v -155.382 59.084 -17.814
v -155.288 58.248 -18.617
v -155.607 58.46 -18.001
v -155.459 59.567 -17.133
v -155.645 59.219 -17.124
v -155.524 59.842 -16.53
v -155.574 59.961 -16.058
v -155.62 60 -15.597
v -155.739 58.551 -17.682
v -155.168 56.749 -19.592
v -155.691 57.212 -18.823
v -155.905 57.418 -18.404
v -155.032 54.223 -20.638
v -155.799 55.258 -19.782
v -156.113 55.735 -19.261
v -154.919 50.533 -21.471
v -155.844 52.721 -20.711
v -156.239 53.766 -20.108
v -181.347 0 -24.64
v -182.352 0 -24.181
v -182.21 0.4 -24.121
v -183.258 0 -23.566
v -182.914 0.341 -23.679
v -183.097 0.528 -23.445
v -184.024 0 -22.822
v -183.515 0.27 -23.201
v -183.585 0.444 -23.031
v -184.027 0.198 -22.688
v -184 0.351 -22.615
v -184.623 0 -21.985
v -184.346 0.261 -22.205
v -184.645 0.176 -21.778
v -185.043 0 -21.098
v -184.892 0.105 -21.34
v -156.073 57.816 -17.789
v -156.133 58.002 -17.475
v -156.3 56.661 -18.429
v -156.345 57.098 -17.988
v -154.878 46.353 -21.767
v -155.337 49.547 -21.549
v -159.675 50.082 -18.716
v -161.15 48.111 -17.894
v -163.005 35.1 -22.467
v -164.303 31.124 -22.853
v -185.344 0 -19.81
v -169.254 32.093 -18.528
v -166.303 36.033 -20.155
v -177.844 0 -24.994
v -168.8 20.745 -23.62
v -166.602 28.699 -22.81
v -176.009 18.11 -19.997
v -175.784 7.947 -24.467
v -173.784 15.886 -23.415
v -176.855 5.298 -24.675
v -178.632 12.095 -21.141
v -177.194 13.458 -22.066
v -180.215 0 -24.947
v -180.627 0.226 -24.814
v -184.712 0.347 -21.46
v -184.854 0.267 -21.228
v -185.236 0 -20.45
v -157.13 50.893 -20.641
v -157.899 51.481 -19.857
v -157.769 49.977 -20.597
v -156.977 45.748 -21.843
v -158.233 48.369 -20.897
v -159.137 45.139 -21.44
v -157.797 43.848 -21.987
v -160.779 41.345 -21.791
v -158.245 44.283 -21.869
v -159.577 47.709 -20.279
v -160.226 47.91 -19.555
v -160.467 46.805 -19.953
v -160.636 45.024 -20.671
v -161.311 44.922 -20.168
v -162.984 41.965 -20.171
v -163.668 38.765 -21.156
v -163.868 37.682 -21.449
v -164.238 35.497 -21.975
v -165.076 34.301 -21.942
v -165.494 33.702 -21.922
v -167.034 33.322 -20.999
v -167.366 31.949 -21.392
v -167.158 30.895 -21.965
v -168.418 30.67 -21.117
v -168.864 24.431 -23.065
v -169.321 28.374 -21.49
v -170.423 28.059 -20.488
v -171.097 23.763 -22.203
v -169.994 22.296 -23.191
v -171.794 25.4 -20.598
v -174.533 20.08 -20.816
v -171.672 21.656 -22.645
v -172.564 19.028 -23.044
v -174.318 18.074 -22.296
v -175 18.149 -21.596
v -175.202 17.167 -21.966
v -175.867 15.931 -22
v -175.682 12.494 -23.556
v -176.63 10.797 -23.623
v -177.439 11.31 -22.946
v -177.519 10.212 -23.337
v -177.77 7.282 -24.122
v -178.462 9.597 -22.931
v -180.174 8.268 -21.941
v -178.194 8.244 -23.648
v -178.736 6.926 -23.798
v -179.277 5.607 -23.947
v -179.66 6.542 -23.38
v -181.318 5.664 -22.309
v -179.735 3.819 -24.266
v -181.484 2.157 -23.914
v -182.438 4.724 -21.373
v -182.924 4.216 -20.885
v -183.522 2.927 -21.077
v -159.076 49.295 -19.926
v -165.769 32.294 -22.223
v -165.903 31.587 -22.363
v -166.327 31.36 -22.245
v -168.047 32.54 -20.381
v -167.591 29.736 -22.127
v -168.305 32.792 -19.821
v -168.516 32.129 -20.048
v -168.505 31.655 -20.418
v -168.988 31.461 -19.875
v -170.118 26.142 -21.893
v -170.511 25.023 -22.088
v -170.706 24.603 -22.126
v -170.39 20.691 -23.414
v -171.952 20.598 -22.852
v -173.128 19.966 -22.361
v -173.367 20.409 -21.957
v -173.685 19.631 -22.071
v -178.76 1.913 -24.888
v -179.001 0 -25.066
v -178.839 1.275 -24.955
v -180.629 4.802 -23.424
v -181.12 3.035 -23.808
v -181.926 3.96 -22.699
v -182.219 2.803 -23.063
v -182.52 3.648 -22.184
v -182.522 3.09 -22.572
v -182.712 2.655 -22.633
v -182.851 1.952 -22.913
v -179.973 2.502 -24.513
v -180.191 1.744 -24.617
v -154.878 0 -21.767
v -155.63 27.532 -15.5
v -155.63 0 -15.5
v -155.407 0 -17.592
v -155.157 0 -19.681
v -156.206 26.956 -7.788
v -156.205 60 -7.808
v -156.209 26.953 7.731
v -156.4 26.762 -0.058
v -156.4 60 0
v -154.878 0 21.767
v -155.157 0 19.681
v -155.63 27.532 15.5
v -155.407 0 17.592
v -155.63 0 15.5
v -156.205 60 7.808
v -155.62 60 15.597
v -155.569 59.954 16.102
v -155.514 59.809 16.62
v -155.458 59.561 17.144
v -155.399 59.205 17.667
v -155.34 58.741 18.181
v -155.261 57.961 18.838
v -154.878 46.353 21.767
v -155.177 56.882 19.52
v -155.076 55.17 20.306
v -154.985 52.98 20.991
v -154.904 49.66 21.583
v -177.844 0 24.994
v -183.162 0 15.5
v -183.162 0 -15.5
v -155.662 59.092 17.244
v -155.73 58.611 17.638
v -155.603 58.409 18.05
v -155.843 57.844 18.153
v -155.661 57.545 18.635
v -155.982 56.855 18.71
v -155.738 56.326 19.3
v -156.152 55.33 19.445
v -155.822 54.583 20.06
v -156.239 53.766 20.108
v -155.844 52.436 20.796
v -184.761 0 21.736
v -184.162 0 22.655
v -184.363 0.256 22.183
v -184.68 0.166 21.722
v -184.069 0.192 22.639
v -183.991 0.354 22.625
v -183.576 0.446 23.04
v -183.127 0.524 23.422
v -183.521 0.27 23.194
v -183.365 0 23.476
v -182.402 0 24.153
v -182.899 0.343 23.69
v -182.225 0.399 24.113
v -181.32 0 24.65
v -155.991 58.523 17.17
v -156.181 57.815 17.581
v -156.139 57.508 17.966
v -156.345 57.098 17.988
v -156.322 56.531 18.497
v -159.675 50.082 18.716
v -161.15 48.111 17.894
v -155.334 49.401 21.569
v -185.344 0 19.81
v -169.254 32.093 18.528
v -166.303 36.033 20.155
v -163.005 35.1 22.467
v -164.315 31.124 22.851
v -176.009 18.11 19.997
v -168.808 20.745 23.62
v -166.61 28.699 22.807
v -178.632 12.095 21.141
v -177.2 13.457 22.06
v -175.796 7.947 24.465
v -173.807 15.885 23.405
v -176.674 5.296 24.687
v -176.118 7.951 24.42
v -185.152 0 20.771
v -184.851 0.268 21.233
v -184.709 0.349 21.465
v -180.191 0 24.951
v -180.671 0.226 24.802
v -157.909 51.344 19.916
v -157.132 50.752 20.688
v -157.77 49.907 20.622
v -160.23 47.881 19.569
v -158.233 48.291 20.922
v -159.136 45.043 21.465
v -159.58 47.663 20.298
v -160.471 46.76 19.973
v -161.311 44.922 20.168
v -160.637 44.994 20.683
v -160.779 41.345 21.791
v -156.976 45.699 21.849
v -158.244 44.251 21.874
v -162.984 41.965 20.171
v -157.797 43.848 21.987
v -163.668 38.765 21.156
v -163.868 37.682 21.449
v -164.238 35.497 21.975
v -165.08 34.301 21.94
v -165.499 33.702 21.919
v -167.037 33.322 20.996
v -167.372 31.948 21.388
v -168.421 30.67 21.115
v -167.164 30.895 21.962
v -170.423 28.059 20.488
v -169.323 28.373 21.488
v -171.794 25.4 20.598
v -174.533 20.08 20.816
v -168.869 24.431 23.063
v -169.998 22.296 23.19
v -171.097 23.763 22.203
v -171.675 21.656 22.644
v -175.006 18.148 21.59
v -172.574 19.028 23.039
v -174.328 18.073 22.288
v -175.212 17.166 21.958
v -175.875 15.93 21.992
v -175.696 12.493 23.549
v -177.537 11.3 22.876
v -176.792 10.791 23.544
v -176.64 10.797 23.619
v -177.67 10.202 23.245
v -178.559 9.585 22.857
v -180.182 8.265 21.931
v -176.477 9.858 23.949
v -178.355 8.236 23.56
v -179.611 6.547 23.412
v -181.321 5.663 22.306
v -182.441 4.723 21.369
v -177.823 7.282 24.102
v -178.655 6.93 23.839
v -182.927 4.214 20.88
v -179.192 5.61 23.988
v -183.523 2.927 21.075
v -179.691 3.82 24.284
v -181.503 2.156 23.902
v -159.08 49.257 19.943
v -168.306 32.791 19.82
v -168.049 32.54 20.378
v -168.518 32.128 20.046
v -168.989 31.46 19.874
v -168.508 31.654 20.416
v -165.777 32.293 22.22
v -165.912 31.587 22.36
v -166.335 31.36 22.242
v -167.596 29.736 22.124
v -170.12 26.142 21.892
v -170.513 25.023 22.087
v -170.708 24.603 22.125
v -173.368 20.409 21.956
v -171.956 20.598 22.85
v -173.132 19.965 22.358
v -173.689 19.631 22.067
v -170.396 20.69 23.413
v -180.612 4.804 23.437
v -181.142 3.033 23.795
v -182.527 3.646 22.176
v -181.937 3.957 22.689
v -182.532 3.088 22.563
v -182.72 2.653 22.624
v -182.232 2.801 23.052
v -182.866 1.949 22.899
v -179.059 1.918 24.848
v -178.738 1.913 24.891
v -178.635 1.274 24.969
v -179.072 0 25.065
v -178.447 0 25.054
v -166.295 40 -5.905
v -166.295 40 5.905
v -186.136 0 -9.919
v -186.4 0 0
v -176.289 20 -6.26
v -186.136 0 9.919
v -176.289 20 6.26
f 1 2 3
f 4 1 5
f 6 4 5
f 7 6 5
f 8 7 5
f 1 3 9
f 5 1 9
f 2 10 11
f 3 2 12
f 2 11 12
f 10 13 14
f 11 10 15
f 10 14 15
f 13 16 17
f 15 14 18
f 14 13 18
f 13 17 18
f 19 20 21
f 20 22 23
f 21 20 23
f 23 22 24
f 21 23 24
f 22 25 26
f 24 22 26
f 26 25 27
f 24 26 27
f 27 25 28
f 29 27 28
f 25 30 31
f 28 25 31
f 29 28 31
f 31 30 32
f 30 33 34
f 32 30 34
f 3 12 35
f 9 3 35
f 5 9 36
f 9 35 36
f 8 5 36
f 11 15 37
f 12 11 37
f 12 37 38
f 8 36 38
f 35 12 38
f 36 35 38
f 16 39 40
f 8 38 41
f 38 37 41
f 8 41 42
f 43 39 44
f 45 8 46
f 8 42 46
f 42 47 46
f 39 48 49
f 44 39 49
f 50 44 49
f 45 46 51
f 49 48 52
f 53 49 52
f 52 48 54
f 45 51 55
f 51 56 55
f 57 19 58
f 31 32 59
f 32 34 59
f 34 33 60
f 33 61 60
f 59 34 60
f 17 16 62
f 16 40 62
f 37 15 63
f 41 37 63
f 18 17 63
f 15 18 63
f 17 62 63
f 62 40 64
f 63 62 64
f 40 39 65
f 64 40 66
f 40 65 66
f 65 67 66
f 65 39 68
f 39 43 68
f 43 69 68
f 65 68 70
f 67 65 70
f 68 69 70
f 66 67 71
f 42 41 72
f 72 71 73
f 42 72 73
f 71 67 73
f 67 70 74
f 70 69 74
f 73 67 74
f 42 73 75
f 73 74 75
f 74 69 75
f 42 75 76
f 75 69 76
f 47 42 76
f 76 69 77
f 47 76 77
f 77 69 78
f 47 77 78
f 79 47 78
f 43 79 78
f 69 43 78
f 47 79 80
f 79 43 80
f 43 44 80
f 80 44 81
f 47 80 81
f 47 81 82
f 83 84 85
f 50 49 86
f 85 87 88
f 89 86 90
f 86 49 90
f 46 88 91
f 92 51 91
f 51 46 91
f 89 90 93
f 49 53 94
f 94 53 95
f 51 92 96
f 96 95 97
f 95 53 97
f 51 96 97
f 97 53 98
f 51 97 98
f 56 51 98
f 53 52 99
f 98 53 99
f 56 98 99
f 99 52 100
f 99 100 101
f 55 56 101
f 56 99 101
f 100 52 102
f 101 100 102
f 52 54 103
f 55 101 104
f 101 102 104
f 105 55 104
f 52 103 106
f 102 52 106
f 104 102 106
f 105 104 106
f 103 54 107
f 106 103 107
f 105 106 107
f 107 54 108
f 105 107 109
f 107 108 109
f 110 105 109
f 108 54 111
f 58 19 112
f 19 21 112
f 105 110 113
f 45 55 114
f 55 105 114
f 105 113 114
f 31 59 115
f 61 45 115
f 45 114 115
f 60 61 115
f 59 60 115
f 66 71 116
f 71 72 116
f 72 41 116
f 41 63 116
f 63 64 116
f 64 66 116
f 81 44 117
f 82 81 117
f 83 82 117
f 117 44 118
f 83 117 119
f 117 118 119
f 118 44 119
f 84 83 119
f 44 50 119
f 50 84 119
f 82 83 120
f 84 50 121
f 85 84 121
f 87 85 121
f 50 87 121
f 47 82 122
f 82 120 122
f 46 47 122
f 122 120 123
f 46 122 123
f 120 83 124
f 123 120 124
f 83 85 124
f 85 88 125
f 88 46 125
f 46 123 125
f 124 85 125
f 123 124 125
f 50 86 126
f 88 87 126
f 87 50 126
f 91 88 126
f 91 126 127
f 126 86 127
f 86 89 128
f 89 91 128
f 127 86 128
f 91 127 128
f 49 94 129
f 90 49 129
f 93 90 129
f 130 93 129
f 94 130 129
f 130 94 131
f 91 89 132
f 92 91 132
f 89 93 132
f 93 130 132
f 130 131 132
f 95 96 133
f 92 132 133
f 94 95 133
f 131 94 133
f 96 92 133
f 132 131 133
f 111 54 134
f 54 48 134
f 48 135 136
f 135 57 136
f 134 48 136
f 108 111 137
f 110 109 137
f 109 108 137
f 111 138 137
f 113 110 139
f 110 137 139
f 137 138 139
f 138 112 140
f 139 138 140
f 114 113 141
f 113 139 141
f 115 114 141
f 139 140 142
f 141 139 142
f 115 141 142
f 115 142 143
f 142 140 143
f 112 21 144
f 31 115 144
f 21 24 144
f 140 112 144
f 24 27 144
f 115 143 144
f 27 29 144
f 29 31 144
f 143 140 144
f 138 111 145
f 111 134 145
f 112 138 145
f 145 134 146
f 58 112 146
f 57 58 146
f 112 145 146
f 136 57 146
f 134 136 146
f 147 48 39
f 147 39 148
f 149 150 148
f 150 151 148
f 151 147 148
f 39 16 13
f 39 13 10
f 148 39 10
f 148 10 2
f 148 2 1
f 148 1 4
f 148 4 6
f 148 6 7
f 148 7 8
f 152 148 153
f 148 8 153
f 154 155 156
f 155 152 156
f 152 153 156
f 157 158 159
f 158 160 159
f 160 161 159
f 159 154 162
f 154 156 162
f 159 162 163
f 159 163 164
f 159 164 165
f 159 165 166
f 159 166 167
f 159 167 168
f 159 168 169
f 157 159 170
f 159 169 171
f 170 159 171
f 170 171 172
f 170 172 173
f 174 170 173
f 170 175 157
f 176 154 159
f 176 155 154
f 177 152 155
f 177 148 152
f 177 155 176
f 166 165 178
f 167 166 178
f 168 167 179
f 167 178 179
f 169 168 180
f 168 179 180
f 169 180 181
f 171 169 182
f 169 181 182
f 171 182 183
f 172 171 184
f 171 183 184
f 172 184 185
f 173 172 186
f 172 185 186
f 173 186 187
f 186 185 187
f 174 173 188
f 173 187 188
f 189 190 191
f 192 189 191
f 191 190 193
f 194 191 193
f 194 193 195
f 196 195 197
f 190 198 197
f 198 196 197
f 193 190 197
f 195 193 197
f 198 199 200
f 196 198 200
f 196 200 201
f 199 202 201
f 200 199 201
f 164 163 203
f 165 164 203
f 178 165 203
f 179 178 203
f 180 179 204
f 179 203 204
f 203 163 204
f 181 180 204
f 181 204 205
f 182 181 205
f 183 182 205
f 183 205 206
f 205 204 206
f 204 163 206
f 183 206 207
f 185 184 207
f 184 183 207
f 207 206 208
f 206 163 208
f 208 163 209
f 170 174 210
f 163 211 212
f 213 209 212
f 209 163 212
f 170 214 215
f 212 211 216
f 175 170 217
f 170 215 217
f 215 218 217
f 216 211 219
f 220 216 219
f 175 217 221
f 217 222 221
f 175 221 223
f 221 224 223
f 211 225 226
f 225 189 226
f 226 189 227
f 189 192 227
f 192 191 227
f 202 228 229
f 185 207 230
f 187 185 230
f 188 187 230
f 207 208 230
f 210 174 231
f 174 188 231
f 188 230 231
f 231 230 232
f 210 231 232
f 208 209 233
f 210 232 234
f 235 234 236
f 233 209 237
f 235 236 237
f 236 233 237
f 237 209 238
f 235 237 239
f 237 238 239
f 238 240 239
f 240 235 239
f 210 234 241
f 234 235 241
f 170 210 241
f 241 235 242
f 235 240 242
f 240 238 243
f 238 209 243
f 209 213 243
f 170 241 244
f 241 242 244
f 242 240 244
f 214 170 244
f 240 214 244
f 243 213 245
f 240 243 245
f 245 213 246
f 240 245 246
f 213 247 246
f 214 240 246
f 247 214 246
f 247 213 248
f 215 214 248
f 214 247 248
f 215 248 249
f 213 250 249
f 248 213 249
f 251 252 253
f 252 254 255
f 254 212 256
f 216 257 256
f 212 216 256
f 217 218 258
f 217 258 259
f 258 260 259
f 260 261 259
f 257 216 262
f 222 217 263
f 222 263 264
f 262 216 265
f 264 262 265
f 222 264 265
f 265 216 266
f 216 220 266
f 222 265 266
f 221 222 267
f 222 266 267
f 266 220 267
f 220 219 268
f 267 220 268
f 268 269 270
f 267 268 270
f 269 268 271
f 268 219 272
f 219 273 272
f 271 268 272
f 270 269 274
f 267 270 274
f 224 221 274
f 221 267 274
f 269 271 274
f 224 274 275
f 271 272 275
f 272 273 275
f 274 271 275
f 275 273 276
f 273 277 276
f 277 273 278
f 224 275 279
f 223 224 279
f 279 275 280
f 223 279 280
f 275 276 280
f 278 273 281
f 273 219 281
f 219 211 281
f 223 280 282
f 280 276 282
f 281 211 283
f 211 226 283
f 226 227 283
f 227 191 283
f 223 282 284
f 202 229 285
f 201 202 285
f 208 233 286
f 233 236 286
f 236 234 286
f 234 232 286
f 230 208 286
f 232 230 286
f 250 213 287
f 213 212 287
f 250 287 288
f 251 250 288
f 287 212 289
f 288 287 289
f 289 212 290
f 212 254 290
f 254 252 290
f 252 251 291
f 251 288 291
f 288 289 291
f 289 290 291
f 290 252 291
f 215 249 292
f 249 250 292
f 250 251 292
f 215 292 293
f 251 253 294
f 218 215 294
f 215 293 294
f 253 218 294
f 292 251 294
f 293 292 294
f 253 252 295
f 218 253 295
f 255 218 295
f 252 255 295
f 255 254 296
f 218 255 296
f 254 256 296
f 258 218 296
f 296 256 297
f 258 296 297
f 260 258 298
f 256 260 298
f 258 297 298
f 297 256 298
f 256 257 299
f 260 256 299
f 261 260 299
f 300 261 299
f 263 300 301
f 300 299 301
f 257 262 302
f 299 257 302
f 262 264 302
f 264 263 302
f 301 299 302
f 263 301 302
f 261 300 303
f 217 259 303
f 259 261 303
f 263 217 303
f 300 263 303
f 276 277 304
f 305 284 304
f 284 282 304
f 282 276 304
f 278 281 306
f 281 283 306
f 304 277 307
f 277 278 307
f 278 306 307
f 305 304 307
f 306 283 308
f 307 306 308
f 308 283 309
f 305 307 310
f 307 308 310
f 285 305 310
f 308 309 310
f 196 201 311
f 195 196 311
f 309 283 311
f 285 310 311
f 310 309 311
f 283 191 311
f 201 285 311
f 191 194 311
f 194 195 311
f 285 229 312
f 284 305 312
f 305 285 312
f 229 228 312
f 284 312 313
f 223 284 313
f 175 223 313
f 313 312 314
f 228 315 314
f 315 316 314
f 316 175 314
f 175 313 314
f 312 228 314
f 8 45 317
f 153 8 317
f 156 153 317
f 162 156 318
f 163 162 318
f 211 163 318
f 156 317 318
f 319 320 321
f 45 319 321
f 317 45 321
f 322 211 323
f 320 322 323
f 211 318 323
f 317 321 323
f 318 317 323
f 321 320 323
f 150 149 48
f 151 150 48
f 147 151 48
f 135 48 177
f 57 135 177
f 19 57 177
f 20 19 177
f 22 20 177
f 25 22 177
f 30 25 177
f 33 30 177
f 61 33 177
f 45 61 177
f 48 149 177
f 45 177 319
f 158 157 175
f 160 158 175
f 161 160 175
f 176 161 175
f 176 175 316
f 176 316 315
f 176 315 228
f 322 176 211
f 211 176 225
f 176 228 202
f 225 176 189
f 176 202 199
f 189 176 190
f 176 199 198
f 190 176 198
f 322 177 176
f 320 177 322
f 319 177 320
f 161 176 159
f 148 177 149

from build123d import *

# Parameters (mm, degrees)
REVOLVE1_ANGLE           = 8
REVOLVE1_OTHER_WAY_ANGLE = 8
CUT_EXTRUDE1_DEPTH       = 15.5
CUT_EXTRUDE1_DEPTH_BACK  = 15.5
FILLET1_R                = 6


with BuildPart() as part:
    # Sketch4 → Revolve1 (revolve)
    with BuildSketch(Plane.XY):
        Polygon((-156.4, 0), (-156.4, 60), (-186.4, 0), align=None)
    revolve(axis=Axis((0, 70, 0), (0, -1, 0)), revolution_arc=REVOLVE1_ANGLE)

    # Sketch4 → Revolve1 other way (revolve)
    with BuildSketch(Plane.XY):
        Polygon((-156.4, 0), (-156.4, 60), (-186.4, 0), align=None)
    revolve(axis=Axis((0, 70, 0), (0, 1, 0)), revolution_arc=REVOLVE1_OTHER_WAY_ANGLE)

    # Sketch6 → Cut-Extrude1 (cut, two sides: drawn at the far end of the back side and taken through both)
    with BuildSketch(Plane.XY.offset(-CUT_EXTRUDE1_DEPTH_BACK)):
        Polygon((-154.877925951, 28.284271247), (-183.162197199, 0), (-154.877925951, 0), align=None)
    extrude(amount=CUT_EXTRUDE1_DEPTH + CUT_EXTRUDE1_DEPTH_BACK, mode=Mode.SUBTRACT)

    # Fillet1
    fillet1_edges = [part.edges().sort_by_distance(p)[0] for p in [
        (-169.731946982, 30, 23.854269505),
        (-169.731946982, 30, -23.854269505),
    ]]
    fillet(fillet1_edges, radius=FILLET1_R)


solid = part.part
